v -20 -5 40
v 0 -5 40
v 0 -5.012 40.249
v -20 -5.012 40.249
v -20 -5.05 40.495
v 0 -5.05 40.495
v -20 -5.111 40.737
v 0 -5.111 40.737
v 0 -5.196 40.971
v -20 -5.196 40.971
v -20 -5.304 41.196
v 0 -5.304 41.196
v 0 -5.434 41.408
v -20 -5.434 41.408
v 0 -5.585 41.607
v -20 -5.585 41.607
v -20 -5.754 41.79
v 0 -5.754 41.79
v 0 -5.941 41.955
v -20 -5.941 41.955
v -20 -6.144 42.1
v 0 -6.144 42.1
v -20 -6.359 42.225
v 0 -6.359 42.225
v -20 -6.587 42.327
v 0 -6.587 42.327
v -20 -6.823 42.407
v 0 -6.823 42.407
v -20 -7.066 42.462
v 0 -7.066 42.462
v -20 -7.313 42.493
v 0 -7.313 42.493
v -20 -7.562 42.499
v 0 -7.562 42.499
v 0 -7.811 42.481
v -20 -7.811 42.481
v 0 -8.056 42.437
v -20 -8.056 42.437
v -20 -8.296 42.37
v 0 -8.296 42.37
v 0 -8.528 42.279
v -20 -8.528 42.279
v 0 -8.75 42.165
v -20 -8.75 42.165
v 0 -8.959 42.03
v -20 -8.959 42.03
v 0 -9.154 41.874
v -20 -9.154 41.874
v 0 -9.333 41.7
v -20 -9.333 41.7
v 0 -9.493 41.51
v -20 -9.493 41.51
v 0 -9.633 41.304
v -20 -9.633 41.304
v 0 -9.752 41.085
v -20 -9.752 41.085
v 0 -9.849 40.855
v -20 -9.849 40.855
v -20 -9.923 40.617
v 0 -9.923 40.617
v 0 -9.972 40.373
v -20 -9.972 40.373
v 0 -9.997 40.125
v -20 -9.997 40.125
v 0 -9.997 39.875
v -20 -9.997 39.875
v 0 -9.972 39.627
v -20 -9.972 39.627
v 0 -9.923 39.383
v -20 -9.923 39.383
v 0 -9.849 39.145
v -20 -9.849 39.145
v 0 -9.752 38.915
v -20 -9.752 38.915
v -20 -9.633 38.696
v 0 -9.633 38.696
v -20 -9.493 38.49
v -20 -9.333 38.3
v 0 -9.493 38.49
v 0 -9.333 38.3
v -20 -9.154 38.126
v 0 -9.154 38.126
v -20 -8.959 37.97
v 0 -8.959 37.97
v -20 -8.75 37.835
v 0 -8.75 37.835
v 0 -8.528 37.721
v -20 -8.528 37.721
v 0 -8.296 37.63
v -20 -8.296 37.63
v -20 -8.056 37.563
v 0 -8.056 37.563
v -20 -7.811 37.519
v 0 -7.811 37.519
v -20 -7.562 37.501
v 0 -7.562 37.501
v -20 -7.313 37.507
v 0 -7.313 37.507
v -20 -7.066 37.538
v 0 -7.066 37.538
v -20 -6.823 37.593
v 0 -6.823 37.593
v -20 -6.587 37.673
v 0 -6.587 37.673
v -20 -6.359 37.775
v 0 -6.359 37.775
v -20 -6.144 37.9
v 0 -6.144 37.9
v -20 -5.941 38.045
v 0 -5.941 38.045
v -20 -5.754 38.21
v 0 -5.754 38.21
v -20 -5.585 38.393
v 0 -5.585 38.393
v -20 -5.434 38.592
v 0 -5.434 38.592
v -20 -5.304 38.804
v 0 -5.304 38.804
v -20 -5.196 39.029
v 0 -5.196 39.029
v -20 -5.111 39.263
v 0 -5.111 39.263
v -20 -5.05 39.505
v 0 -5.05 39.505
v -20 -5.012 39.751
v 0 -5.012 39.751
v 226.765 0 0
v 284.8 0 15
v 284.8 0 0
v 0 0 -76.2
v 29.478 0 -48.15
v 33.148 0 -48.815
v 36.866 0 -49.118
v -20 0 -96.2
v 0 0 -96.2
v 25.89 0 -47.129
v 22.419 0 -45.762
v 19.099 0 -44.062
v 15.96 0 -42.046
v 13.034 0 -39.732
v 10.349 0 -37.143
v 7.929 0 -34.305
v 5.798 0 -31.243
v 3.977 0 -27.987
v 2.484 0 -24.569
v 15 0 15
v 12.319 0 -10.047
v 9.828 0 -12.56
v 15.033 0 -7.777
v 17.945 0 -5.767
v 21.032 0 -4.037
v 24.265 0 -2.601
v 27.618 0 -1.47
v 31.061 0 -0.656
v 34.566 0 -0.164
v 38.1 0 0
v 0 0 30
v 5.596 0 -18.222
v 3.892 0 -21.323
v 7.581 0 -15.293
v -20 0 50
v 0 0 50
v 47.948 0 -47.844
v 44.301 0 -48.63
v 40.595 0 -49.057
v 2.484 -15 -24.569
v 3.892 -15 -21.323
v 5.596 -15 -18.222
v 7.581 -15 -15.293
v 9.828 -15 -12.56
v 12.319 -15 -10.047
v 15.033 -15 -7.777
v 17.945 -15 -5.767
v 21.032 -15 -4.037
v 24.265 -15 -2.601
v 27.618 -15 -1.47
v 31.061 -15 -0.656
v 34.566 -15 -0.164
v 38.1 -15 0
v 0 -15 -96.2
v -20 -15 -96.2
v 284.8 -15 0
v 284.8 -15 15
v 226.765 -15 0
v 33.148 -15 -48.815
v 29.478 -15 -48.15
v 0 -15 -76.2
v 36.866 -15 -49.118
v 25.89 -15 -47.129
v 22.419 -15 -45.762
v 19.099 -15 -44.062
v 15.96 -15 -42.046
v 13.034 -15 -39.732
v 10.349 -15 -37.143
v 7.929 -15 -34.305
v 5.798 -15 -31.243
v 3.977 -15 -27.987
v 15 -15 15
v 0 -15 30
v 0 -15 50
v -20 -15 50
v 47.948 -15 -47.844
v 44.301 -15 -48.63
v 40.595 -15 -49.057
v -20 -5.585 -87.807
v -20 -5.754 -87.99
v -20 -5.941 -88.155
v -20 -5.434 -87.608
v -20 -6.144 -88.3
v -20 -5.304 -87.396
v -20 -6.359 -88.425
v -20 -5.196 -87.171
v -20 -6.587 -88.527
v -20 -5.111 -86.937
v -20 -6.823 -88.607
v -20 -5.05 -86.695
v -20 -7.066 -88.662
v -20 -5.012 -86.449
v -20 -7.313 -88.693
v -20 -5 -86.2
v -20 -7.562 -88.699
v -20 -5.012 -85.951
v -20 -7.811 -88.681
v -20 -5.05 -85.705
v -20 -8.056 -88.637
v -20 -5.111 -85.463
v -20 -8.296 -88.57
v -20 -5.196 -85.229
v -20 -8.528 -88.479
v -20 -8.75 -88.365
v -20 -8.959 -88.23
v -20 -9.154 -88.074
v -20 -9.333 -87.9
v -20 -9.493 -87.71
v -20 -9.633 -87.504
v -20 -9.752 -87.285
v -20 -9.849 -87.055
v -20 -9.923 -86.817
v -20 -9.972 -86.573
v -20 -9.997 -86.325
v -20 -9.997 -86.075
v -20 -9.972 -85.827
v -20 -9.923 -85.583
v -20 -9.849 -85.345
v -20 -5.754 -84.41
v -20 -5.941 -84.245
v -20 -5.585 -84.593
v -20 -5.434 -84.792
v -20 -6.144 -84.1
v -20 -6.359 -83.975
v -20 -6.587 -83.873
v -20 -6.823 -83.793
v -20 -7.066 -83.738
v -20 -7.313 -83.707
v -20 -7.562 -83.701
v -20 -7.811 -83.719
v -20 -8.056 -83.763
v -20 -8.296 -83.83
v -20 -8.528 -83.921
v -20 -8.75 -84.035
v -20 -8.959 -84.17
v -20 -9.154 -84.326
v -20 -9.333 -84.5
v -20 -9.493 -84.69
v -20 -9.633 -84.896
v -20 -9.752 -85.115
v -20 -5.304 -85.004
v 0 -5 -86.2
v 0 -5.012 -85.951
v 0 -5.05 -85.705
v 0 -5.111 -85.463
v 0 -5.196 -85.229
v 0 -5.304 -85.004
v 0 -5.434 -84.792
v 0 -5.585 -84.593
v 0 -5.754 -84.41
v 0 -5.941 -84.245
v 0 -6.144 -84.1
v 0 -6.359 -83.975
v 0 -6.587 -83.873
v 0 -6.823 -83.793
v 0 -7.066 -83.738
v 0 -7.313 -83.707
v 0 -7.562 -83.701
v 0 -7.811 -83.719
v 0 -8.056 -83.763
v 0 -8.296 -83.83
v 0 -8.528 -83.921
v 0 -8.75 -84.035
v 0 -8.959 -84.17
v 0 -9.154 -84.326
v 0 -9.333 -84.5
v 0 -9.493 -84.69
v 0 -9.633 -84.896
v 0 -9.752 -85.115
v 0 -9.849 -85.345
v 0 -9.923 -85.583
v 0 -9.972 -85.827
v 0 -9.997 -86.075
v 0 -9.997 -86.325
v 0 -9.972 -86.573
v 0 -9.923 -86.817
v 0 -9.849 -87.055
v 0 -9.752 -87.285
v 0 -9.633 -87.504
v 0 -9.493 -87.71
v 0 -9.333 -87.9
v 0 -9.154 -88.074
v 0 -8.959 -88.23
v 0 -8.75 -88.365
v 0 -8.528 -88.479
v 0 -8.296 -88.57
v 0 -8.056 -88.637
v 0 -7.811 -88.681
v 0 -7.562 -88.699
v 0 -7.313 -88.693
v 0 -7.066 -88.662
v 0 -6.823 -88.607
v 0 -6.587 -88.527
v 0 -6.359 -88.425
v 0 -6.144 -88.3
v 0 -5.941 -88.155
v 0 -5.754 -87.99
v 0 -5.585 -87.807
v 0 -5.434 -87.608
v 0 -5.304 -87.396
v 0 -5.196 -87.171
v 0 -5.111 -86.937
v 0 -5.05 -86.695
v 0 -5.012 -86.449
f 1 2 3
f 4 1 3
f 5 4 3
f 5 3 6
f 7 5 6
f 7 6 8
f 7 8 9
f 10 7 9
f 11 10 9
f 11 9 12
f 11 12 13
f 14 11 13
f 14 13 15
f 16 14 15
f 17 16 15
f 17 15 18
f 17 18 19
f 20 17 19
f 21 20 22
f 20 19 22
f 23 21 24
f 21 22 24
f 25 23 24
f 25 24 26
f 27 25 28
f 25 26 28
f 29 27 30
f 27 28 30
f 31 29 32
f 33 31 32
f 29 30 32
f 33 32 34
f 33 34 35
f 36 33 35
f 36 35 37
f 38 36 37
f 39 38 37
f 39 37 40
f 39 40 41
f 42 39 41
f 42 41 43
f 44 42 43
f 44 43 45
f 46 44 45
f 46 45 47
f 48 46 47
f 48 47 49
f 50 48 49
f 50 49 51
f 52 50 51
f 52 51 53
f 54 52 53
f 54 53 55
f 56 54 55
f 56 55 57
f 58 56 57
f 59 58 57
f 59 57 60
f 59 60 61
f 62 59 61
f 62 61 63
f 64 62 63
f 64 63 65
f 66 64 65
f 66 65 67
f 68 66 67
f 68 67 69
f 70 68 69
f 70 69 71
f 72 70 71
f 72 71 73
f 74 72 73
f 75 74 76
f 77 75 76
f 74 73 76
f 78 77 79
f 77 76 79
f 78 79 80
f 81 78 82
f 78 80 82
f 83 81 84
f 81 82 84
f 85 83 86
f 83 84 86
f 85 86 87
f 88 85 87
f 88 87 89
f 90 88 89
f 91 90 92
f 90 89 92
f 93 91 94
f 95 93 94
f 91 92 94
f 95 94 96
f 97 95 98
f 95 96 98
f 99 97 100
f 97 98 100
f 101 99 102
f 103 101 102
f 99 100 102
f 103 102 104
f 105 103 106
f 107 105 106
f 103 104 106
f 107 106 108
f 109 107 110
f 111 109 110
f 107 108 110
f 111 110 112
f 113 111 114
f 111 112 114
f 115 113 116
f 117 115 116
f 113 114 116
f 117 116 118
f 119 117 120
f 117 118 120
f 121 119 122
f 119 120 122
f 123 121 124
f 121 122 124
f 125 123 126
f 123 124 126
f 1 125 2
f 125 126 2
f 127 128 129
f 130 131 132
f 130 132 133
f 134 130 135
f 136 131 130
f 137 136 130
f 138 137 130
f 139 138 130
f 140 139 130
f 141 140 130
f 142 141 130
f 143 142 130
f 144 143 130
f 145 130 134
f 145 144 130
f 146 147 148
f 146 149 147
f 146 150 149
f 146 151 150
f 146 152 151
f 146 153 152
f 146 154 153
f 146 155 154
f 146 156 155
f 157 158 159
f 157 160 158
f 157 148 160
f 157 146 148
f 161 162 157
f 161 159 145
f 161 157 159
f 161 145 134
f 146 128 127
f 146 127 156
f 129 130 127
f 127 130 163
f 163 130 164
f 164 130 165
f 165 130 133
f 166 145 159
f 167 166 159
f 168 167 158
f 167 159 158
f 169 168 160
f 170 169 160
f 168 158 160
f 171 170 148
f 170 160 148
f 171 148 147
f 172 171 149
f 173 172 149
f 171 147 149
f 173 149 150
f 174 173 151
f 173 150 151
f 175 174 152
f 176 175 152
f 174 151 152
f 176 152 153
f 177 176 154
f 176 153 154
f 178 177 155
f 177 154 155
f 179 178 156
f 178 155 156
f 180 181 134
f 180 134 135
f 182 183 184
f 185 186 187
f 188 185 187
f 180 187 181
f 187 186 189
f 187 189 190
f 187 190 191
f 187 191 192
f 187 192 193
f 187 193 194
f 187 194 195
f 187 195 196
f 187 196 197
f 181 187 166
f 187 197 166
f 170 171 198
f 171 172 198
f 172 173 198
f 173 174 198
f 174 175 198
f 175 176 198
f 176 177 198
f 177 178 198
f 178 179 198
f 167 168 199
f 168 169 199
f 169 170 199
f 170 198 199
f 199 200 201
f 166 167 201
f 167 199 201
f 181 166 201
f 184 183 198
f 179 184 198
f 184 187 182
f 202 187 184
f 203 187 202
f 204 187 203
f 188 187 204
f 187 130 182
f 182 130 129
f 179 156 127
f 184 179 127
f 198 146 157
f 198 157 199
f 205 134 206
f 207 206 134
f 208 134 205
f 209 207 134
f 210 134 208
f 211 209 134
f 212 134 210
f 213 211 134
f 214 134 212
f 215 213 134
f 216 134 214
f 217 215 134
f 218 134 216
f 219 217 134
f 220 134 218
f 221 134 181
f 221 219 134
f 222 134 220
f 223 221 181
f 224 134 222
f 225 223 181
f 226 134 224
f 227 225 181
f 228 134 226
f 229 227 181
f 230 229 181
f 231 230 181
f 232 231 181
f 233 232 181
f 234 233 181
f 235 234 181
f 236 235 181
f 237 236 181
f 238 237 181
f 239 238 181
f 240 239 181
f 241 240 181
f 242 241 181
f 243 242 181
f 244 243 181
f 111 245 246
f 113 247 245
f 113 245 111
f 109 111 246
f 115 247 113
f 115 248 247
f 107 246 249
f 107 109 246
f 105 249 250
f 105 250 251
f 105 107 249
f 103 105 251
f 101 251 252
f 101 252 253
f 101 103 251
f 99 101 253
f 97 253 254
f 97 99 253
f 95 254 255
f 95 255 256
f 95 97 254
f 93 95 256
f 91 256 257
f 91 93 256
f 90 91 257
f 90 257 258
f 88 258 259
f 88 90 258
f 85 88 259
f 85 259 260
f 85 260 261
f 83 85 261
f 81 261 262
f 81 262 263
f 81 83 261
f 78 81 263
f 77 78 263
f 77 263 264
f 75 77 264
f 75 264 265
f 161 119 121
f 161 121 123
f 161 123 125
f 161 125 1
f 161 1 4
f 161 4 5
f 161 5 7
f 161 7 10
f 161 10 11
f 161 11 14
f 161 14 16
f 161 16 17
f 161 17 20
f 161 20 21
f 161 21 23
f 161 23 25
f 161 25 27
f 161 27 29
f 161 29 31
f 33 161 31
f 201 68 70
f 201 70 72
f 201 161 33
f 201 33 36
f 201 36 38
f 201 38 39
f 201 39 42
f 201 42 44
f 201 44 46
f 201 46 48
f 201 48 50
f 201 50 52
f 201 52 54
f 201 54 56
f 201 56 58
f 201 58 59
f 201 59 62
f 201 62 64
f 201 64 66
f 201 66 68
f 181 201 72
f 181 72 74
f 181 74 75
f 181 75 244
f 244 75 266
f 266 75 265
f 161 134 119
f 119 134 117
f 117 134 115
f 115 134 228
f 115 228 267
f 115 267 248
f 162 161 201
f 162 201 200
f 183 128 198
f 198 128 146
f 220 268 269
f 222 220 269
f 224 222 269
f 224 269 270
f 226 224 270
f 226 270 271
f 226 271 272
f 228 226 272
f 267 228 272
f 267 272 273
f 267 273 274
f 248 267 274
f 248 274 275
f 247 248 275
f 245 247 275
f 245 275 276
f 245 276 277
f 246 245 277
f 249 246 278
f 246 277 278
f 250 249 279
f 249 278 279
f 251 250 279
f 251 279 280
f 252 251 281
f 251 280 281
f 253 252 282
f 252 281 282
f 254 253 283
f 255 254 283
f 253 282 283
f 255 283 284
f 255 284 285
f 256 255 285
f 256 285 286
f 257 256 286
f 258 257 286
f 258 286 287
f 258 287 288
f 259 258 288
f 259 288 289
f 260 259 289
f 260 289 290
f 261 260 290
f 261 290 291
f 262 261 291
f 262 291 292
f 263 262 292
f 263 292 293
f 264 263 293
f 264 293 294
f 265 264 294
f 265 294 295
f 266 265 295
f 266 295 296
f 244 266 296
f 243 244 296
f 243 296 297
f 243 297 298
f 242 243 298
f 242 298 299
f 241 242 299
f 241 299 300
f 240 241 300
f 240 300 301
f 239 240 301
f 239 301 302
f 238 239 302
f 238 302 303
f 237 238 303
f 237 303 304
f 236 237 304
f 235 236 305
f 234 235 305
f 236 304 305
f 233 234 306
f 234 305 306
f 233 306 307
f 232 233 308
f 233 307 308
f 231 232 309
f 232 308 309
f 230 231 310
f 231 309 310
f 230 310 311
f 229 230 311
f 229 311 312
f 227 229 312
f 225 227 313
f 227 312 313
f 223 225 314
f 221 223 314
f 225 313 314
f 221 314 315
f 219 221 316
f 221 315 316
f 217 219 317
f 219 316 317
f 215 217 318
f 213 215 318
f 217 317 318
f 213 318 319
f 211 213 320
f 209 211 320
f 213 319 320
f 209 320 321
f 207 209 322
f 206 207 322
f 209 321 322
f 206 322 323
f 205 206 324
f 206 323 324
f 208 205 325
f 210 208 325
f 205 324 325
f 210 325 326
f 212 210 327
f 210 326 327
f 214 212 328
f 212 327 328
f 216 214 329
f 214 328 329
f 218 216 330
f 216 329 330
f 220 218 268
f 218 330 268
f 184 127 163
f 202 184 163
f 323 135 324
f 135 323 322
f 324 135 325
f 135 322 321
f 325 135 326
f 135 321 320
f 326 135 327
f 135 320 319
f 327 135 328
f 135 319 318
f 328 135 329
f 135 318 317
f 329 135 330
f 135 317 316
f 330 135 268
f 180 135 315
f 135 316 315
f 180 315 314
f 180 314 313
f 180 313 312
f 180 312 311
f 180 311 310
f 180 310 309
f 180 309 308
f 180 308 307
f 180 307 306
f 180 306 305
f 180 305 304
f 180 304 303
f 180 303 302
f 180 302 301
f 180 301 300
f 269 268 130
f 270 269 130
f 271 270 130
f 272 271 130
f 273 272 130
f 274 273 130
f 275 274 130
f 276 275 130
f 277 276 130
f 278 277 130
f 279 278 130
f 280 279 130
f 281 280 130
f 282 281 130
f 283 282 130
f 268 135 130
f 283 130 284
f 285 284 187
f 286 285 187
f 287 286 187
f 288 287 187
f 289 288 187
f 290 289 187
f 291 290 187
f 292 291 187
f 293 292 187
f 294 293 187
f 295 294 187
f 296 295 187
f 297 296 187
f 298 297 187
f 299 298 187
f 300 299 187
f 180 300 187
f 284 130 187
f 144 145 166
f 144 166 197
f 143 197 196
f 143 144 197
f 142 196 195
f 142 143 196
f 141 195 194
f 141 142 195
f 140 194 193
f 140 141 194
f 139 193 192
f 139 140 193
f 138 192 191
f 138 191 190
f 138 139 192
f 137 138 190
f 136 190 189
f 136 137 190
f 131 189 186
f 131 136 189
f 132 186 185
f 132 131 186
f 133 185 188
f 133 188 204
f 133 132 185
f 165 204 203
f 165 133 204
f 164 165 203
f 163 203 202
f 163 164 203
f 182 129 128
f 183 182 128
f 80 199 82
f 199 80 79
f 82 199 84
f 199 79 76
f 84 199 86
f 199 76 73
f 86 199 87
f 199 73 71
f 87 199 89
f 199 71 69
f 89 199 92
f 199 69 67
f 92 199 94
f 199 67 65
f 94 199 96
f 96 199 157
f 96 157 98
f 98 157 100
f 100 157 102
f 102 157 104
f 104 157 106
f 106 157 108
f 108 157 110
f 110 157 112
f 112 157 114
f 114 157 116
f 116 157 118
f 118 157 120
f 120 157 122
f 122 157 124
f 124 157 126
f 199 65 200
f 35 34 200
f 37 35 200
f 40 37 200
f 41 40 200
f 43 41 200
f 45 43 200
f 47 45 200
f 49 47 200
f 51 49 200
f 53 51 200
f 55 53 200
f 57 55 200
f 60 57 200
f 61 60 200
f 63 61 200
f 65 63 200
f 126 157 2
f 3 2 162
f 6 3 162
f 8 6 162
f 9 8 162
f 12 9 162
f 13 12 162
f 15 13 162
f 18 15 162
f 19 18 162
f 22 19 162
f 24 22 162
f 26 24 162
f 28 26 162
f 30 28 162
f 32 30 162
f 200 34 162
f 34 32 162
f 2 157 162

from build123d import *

# Parameters (mm, degrees)
F0_W        = 20
F0_H        = 35
F1_DEPTH    = 15
F2_SIZE     = 15
F3_R        = 2.5
F4_DEPTH    = 20.001
F5_W        = 20
F5_H        = 15
F6_DEPTH    = 20
F7_R        = 2.5
F8_DEPTH    = 20.001
F9_T1_DEPTH = 15


# Not quite as in the source:
# - a fillet or chamfer that OpenCascade refuses, or shapes differently, is made with other operations: its cross-section is extruded or revolved along the edge and cut away or added


with BuildPart() as f1:
    # F0 (on Front) → F1 (new body)
    with BuildSketch(Plane.XZ):
        with Locations((-10, 32.5)):
            Rectangle(F0_W, F0_H)
        Polygon((0, 15), (0, 0), (226.7650184275, 0), (284.8, 0), (284.8, 15), align=None)
        Polygon((284.8, 0), (226.7650184275, 0), (0, -60.6723820371), (0, -76.2), align=None)
        Polygon((0, -60.6723820371), (0, 0), (0, 15), (-20, 15), (-20, -76.2), (0, -76.2), align=None)
    extrude(amount=F1_DEPTH)

    # F2
    f2_edges = [f1.edges().sort_by_distance(p)[0] for p in [
        (0, -7.5, 15),
    ]]
    chamfer(f2_edges, length=F2_SIZE)

    # F3 (on face) → F4 (cut, through all)
    with BuildSketch(Plane.YZ):
        with Locations((-7.5, 40)):
            Circle(F3_R)
    extrude(amount=-F4_DEPTH, mode=Mode.SUBTRACT)

    # F5 (on face) → F6 (join)
    with BuildSketch(Plane(origin=(0, 0, -76.2), x_dir=(1, 0, 0), z_dir=(0, 0, -1))):
        with Locations((-10, 7.5)):
            Rectangle(F5_W, F5_H)
    extrude(amount=F6_DEPTH)

    # F7 (on face) → F8 (cut, through all)
    with BuildSketch(Plane.YZ):
        with Locations((-7.5, -86.2)):
            Circle(F7_R)
    extrude(amount=-F8_DEPTH, mode=Mode.SUBTRACT)

    # F9: fillet of radius 38.1 on 2 edges, made by hand

    # F9_s2 → F9_t1 (join)
    with BuildSketch(Plane.XZ):
        with BuildLine():
            ThreePointArc((0, -11.038341962), (14.9006475381, -41.2608508809), (47.9475089423, -47.8437297148))
            Line((47.9475089423, -47.8437297148), (0, -60.6723820371))
            Line((0, -60.6723820371), (0, -11.038341962))
        make_face()
        with BuildLine():
            ThreePointArc((0, -38.1), (11.1592316368, -11.1592316368), (38.1, 0))
            Line((38.1, 0), (0, 0))
            Line((0, 0), (0, -38.1))
        make_face()
    extrude(amount=F9_T1_DEPTH)


solid = f1.part
